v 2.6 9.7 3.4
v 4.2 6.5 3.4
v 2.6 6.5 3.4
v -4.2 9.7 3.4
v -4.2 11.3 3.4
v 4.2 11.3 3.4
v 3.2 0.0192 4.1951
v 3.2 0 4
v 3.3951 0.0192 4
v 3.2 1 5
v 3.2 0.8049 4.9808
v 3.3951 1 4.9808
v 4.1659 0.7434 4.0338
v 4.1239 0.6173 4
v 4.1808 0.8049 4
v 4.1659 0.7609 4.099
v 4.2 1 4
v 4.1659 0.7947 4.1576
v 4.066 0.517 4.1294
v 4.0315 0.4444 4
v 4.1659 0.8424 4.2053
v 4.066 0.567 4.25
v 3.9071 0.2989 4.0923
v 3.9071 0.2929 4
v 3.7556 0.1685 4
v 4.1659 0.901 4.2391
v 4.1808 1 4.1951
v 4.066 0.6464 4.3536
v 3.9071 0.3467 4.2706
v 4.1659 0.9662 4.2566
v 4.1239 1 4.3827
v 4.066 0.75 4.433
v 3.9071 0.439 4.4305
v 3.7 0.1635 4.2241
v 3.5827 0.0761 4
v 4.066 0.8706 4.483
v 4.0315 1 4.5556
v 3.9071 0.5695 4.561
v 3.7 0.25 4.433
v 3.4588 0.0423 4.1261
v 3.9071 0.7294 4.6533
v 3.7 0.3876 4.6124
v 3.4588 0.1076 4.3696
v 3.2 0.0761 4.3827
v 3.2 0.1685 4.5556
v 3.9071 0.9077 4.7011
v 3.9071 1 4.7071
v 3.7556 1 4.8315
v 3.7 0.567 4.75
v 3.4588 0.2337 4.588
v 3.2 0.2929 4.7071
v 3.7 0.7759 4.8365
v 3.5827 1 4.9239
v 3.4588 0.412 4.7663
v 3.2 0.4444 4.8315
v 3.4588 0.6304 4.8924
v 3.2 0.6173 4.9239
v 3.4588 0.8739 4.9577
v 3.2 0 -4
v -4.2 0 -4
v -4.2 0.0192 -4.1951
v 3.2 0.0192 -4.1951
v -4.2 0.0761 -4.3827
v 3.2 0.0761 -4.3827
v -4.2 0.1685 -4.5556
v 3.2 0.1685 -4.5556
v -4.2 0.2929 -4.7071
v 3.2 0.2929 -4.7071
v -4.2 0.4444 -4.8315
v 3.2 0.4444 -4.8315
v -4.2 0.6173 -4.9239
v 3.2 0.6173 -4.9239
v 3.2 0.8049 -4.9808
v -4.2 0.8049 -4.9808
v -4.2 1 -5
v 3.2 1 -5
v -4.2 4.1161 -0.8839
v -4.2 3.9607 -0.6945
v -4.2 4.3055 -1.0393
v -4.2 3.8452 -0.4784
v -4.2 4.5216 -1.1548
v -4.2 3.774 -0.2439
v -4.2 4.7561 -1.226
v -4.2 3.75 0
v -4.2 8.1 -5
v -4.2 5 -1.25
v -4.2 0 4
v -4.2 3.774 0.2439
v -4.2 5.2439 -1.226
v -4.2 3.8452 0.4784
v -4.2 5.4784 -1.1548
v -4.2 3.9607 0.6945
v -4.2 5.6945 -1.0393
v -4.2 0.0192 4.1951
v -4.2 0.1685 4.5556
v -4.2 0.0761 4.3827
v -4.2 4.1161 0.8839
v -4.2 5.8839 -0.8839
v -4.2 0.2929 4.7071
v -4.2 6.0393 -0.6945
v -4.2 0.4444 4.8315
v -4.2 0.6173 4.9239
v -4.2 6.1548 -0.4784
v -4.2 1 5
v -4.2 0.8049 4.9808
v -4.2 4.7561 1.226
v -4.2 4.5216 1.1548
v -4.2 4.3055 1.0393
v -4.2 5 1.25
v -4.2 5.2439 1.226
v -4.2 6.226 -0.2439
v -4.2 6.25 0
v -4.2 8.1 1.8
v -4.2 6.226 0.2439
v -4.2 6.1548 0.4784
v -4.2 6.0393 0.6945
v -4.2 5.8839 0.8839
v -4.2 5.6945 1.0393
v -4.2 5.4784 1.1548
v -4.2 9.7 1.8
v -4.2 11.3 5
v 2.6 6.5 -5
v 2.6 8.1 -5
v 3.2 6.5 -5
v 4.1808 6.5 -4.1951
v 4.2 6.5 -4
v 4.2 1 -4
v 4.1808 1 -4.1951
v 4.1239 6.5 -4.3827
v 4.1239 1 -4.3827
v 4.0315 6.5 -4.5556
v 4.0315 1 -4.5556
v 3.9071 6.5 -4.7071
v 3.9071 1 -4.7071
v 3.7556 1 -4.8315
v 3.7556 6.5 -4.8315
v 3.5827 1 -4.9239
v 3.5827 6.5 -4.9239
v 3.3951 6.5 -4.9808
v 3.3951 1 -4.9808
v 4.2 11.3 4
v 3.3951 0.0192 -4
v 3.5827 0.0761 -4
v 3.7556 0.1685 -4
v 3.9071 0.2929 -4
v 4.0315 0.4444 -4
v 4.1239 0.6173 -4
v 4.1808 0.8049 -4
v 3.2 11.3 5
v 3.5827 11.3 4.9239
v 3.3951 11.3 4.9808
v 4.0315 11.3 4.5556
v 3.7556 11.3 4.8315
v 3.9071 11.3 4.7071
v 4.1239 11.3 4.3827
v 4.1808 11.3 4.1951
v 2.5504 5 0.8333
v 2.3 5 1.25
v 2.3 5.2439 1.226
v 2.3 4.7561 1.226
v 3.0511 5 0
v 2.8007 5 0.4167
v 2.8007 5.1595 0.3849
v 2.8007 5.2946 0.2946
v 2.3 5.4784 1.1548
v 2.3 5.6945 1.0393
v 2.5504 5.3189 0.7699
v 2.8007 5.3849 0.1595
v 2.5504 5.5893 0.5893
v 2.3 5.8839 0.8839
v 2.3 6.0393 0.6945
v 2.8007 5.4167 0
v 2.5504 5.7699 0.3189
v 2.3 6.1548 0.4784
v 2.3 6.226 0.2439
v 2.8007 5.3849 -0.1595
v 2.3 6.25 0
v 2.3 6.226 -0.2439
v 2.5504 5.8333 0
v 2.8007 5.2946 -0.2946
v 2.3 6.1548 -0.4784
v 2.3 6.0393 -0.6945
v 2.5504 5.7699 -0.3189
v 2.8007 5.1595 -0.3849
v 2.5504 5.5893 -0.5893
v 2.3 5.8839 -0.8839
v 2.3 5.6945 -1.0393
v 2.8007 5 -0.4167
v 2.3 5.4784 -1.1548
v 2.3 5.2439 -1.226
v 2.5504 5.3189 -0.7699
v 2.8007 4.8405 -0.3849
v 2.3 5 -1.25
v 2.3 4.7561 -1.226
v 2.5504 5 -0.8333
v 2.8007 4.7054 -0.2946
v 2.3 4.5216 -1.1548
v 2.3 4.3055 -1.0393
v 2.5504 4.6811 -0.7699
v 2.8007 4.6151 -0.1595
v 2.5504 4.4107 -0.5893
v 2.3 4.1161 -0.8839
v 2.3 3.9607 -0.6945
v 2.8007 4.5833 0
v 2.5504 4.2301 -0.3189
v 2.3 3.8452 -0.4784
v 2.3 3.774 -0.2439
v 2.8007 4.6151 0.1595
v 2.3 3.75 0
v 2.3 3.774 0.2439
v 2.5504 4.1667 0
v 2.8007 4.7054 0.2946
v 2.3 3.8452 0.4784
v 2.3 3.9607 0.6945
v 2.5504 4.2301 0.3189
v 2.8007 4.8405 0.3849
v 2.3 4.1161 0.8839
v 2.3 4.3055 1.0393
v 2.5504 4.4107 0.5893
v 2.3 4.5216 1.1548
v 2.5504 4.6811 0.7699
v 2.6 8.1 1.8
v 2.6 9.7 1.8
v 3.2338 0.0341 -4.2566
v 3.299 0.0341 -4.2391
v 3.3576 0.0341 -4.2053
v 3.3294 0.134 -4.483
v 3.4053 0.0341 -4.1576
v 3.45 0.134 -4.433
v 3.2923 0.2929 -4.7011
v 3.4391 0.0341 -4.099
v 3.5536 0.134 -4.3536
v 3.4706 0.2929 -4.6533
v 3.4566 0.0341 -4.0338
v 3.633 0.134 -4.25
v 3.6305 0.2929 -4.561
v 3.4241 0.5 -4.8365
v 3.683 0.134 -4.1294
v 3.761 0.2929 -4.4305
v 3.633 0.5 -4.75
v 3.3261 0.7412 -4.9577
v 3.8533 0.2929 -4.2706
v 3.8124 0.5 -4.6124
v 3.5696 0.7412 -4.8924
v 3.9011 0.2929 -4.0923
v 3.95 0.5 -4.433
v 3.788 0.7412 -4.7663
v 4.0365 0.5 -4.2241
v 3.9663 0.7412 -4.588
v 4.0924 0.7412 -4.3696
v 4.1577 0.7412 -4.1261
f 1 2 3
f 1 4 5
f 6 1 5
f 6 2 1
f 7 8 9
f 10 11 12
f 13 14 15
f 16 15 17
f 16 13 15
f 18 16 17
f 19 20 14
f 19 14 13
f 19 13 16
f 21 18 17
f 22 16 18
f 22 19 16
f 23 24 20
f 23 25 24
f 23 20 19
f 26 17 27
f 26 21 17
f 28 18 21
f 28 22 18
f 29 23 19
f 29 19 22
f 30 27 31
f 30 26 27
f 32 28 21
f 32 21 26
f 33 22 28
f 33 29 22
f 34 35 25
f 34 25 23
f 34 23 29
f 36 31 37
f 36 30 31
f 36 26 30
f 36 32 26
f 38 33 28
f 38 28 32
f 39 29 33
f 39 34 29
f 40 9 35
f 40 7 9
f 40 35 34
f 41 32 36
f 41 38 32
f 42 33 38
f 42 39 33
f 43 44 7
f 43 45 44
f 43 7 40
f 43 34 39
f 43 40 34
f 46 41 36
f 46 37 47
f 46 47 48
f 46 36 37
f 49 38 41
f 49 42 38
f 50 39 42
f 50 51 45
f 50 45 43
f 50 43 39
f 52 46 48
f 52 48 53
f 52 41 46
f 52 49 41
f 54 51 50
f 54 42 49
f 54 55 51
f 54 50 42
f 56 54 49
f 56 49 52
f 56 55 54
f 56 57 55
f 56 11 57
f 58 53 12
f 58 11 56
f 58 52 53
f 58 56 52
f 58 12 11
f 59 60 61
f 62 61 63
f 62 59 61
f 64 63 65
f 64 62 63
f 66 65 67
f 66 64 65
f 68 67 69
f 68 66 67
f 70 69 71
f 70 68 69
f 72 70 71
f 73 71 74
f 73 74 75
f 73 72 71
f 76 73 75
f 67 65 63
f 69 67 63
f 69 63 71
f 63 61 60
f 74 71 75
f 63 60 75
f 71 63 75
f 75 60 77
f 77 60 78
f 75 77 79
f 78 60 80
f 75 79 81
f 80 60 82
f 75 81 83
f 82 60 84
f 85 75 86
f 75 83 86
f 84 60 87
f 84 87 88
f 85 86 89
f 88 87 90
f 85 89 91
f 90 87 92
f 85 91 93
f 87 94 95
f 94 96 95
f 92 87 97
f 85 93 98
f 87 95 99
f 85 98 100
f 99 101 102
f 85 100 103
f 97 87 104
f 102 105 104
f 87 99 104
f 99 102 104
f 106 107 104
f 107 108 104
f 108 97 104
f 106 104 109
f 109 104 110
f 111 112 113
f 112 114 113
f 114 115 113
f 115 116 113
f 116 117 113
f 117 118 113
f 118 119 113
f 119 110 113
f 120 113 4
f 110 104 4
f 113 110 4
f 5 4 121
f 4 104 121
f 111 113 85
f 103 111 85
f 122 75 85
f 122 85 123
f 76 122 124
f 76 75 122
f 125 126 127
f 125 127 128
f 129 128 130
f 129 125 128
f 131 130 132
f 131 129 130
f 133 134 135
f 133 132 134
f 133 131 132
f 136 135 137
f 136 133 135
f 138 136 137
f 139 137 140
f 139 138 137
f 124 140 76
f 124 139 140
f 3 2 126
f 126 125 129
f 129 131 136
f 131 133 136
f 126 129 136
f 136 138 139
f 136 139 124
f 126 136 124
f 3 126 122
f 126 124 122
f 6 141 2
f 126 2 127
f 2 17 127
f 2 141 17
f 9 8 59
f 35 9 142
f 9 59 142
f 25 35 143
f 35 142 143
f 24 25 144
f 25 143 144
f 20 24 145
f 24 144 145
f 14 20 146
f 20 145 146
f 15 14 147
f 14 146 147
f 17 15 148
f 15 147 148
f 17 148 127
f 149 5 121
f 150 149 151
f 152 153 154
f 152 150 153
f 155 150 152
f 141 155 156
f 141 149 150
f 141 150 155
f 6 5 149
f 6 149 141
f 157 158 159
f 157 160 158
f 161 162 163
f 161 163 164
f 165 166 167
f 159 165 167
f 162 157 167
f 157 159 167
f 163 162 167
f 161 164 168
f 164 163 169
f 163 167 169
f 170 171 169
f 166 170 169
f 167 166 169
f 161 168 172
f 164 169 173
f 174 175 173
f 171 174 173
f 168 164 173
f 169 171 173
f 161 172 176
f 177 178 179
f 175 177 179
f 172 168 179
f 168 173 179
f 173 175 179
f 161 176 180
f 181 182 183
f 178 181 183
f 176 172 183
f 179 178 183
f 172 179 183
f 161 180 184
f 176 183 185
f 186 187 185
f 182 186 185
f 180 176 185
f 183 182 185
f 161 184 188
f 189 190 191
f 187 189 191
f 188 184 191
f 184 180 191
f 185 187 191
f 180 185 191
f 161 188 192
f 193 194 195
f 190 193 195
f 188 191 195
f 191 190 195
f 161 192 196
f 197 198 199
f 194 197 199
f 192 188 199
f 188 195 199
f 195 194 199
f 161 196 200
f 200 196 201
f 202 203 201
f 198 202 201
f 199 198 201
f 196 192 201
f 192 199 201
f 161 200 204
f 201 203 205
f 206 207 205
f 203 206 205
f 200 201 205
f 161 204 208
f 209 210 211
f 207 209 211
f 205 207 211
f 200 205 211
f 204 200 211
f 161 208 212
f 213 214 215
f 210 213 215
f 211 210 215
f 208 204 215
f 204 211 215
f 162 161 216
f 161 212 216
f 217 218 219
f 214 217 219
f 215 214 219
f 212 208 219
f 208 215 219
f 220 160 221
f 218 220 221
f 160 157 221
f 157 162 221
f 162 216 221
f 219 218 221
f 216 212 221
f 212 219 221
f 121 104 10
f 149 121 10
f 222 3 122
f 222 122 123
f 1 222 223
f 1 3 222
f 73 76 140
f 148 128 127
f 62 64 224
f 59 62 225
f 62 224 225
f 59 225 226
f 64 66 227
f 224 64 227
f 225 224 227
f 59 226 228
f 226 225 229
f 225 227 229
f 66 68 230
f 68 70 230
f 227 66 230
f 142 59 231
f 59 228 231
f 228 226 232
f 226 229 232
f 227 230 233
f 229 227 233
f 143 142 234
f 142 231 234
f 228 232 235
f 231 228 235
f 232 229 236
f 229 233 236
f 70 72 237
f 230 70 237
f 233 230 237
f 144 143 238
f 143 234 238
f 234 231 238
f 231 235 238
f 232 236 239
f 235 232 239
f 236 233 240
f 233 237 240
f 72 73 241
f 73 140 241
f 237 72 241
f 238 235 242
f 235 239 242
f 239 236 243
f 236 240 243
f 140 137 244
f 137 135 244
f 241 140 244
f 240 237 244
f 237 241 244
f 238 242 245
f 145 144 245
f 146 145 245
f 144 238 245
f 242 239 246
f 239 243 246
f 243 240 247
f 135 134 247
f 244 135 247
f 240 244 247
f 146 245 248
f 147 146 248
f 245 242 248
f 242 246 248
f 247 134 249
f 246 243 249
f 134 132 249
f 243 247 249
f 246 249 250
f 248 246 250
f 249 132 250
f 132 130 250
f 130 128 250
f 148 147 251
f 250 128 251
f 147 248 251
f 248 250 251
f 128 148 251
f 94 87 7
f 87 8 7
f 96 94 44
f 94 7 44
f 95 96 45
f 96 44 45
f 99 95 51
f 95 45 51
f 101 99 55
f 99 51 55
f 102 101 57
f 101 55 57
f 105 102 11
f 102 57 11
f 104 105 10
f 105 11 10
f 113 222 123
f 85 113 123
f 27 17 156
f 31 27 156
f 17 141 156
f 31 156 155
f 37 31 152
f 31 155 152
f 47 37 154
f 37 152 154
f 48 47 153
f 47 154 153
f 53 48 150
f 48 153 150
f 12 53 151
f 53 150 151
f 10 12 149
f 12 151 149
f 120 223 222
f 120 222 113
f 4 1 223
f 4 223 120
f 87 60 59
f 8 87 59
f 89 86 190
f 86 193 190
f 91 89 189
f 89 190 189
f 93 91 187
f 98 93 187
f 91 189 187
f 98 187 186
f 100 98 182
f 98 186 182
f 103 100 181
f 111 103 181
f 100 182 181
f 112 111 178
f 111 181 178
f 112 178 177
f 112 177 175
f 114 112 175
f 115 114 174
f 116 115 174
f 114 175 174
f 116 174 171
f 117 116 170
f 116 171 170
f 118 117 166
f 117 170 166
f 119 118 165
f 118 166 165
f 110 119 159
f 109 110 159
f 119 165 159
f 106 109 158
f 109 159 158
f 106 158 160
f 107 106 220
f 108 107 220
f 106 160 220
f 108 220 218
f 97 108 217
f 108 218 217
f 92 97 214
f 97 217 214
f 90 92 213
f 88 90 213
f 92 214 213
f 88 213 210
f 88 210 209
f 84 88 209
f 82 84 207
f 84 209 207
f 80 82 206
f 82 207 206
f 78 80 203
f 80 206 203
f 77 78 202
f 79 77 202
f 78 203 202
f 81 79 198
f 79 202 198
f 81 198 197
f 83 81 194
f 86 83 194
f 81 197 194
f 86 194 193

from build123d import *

# Parameters (mm, degrees)
SKETCH2_W                 = 8.4
SKETCH2_H                 = 10
BOSS_EXTRUDE1_DEPTH       = 11.3
SKETCH5_W                 = 8.4
SKETCH5_H                 = 1.5
CUT_EXTRUDE2_DEPTH        = 11.3
SKETCH7_W                 = 1.6
SKETCH7_H                 = 3.3
CUT_EXTRUDE4_DEPTH        = 8.4
SKETCH9_W                 = 8.4
SKETCH9_H                 = 1.7
CUT_EXTRUDE5_DEPTH        = 6.8
SKETCH12_W                = 6.8
SKETCH12_H                = 1.6
BOSS_EXTRUDE3_DEPTH       = 1.6
FILLET1_R                 = 1
M3X0_5_TAPPED_HOLE2_D     = 2.5
M3X0_5_TAPPED_HOLE2_DEPTH = 6.5
M3X0_5_TAPPED_HOLE2_TIP   = 0.751075774


with BuildPart() as part:
    # Sketch2 → Boss-Extrude1 (new body)
    with BuildSketch(Plane(origin=(0, 0, 0), x_dir=(1, 0, 0), z_dir=(0, 1, 0))):
        Rectangle(SKETCH2_W, SKETCH2_H)
    extrude(amount=BOSS_EXTRUDE1_DEPTH)

    # Sketch5 → Cut-Extrude2 (cut)
    with BuildSketch(Plane(origin=(4.2, 0, 0), x_dir=(0, 0, -1), z_dir=(1, 0, 0))):
        with Locations((0.8, 10.55)):
            Rectangle(SKETCH5_W, SKETCH5_H)
    extrude(amount=-CUT_EXTRUDE2_DEPTH, mode=Mode.SUBTRACT)

    # Sketch7 → Cut-Extrude4 (cut)
    with BuildSketch(Plane(origin=(0, 0, -5), x_dir=(-1, 0, 0), z_dir=(0, 0, -1))):
        with Locations((-3.4, 8.15)):
            Rectangle(SKETCH7_W, SKETCH7_H)
    extrude(amount=-CUT_EXTRUDE4_DEPTH, mode=Mode.SUBTRACT)

    # Sketch9 → Cut-Extrude5 (cut)
    with BuildSketch(Plane(origin=(2.6, 0, 0), x_dir=(0, 0, -1), z_dir=(1, 0, 0))):
        with Locations((0.8, 8.95)):
            Rectangle(SKETCH9_W, SKETCH9_H)
    extrude(amount=-CUT_EXTRUDE5_DEPTH, mode=Mode.SUBTRACT)

    # Sketch12 → Boss-Extrude3 (add)
    with BuildSketch(Plane(origin=(0, 0, 3.4), x_dir=(-1, 0, 0), z_dir=(0, 0, -1))):
        with Locations((0.8, 8.9)):
            Rectangle(SKETCH12_W, SKETCH12_H)
    extrude(amount=BOSS_EXTRUDE3_DEPTH)

    # Fillet1
    fillet1_edges = [part.edges().sort_by_distance(p)[0] for p in [
        (4.2, 3.25, -5),
        (0, 0, 5),
        (0, 0, -5),
        (4.2, 0, 0),
        (4.2, 5.65, 5),
    ]]
    fillet(fillet1_edges, radius=FILLET1_R)

    # M3x0.5 Tapped Hole2
    with Locations(Plane.ZY.offset(4.2)):
        with Locations((0, 5)):
            Hole(M3X0_5_TAPPED_HOLE2_D / 2, depth=M3X0_5_TAPPED_HOLE2_DEPTH)
            with Locations((0, 0, -(M3X0_5_TAPPED_HOLE2_DEPTH + M3X0_5_TAPPED_HOLE2_TIP / 2))):  # 118° drill point
                Cone(0, M3X0_5_TAPPED_HOLE2_D / 2, M3X0_5_TAPPED_HOLE2_TIP, mode=Mode.SUBTRACT)


solid = part.part
